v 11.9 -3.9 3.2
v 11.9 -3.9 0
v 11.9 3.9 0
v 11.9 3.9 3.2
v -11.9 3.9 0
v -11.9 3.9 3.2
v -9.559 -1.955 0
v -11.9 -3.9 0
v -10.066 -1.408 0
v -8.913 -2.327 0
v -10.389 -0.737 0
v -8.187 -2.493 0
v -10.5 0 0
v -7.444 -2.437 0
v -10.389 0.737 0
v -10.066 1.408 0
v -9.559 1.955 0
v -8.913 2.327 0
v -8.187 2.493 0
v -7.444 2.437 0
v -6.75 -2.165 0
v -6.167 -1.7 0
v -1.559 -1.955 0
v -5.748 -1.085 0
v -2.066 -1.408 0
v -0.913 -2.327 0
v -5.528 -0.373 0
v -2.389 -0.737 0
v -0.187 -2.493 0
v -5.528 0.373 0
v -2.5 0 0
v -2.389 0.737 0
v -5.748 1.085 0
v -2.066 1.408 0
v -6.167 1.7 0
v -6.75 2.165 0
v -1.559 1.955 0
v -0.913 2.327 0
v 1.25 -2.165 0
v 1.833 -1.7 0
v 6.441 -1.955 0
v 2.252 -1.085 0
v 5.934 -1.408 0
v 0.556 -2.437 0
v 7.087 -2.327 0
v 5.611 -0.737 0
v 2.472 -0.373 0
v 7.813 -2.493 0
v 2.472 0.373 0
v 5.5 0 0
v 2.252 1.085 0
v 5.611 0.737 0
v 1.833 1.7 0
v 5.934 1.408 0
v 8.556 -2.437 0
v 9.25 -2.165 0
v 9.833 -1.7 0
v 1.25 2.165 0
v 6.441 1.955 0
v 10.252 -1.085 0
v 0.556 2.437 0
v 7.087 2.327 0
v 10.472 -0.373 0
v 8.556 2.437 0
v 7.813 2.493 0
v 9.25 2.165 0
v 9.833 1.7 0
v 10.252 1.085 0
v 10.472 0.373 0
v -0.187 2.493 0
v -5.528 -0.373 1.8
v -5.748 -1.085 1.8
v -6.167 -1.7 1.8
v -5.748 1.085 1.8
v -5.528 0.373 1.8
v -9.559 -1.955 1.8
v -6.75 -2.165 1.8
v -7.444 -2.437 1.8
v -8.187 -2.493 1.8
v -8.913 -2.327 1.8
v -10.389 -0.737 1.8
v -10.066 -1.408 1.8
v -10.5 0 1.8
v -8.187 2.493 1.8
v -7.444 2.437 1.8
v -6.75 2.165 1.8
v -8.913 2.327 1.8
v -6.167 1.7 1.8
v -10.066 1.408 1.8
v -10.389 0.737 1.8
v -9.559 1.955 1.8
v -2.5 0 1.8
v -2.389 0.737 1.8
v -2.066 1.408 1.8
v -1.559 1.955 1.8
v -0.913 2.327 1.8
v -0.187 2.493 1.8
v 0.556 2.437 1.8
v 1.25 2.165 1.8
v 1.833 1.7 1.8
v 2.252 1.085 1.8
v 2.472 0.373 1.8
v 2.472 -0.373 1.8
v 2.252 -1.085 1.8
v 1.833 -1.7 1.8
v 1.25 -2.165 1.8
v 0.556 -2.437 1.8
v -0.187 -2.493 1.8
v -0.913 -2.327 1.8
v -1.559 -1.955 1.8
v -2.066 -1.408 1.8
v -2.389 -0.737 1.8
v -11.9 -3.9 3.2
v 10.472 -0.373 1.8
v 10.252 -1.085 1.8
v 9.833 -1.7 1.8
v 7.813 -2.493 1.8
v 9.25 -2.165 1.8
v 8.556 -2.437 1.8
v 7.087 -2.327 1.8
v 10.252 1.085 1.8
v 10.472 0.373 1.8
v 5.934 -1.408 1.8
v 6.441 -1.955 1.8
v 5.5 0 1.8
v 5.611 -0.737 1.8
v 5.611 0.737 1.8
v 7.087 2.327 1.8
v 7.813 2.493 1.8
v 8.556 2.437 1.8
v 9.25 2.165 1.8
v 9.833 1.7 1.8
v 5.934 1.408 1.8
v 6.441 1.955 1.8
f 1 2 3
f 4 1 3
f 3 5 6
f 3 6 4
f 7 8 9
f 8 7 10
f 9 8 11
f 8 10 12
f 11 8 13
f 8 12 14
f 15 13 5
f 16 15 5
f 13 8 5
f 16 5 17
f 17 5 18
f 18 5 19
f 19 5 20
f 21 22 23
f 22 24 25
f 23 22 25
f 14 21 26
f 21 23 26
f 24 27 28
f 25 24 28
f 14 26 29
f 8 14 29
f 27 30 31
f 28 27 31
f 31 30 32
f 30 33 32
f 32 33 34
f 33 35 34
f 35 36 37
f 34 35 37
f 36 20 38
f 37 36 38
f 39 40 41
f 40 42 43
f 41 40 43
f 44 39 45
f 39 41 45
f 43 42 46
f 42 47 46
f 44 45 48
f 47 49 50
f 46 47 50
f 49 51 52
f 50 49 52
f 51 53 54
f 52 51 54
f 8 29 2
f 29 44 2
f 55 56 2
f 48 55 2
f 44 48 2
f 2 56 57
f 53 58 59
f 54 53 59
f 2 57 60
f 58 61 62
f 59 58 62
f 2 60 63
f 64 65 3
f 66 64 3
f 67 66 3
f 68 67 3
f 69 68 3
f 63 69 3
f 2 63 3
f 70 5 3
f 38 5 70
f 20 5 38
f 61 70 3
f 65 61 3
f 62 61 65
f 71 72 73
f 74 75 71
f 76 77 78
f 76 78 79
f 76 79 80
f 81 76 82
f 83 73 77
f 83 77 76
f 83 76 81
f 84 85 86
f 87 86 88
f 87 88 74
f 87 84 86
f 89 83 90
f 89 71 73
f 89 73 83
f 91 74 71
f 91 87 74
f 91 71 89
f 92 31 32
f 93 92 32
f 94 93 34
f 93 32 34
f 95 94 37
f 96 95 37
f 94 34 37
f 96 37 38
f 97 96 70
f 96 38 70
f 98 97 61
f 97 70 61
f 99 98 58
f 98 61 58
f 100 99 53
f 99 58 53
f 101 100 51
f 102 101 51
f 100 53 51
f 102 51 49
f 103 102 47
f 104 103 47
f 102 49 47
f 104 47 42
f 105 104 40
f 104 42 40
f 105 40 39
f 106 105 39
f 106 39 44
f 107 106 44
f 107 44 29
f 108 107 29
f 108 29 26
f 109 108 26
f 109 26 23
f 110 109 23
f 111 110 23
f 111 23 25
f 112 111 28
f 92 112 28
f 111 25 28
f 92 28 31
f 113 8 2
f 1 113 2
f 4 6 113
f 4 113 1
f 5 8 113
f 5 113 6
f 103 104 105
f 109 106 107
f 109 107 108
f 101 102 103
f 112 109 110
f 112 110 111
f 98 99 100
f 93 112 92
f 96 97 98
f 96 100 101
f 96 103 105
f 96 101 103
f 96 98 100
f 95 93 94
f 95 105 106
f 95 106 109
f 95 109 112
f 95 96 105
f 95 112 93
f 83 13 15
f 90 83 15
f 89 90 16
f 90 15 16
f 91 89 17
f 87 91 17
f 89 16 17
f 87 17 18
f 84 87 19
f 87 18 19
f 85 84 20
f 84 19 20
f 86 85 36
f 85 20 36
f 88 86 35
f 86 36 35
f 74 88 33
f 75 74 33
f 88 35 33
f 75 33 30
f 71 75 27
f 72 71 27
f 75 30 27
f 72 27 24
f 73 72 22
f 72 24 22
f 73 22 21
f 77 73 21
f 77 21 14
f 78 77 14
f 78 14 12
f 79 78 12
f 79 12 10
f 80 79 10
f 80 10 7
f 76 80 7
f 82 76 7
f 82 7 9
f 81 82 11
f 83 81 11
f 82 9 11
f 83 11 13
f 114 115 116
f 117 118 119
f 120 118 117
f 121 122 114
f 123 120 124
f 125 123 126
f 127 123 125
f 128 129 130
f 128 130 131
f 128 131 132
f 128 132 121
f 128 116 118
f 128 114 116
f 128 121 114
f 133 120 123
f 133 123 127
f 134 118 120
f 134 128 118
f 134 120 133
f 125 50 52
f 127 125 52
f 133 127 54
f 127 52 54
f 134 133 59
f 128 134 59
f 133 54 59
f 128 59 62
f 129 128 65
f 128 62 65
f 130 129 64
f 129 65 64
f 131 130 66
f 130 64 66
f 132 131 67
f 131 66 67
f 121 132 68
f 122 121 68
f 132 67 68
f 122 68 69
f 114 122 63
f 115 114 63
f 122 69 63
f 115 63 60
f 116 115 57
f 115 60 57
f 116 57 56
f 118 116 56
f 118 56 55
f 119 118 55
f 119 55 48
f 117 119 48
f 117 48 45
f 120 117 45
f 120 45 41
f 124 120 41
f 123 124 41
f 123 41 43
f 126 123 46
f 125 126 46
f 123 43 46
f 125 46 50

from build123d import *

# Parameters (mm, degrees)
SKETCH_1_W          = 23.8
SKETCH_1_H          = 7.8
EXTRUDE_1_DEPTH     = 3.2
SKETCH_2_R          = 2.5
CUT_EXTRUDE_1_DEPTH = 1.8


with BuildPart() as part:
    # Эскиз1 → Бобышка-Вытянуть1 (new body)
    with BuildSketch(Plane.XY):
        Rectangle(SKETCH_1_W, SKETCH_1_H)
    extrude(amount=EXTRUDE_1_DEPTH)

    # Эскиз2 → Вырез-Вытянуть1 (cut)
    with BuildSketch(Plane(origin=(0, 0, 0), x_dir=(-1, 0, 0), z_dir=(0, 0, -1))):
        Circle(SKETCH_2_R)
        with Locations((8, 0)):
            Circle(SKETCH_2_R)
        with Locations((-8, 0)):
            Circle(SKETCH_2_R)
    extrude(amount=-CUT_EXTRUDE_1_DEPTH, mode=Mode.SUBTRACT)


solid = part.part
